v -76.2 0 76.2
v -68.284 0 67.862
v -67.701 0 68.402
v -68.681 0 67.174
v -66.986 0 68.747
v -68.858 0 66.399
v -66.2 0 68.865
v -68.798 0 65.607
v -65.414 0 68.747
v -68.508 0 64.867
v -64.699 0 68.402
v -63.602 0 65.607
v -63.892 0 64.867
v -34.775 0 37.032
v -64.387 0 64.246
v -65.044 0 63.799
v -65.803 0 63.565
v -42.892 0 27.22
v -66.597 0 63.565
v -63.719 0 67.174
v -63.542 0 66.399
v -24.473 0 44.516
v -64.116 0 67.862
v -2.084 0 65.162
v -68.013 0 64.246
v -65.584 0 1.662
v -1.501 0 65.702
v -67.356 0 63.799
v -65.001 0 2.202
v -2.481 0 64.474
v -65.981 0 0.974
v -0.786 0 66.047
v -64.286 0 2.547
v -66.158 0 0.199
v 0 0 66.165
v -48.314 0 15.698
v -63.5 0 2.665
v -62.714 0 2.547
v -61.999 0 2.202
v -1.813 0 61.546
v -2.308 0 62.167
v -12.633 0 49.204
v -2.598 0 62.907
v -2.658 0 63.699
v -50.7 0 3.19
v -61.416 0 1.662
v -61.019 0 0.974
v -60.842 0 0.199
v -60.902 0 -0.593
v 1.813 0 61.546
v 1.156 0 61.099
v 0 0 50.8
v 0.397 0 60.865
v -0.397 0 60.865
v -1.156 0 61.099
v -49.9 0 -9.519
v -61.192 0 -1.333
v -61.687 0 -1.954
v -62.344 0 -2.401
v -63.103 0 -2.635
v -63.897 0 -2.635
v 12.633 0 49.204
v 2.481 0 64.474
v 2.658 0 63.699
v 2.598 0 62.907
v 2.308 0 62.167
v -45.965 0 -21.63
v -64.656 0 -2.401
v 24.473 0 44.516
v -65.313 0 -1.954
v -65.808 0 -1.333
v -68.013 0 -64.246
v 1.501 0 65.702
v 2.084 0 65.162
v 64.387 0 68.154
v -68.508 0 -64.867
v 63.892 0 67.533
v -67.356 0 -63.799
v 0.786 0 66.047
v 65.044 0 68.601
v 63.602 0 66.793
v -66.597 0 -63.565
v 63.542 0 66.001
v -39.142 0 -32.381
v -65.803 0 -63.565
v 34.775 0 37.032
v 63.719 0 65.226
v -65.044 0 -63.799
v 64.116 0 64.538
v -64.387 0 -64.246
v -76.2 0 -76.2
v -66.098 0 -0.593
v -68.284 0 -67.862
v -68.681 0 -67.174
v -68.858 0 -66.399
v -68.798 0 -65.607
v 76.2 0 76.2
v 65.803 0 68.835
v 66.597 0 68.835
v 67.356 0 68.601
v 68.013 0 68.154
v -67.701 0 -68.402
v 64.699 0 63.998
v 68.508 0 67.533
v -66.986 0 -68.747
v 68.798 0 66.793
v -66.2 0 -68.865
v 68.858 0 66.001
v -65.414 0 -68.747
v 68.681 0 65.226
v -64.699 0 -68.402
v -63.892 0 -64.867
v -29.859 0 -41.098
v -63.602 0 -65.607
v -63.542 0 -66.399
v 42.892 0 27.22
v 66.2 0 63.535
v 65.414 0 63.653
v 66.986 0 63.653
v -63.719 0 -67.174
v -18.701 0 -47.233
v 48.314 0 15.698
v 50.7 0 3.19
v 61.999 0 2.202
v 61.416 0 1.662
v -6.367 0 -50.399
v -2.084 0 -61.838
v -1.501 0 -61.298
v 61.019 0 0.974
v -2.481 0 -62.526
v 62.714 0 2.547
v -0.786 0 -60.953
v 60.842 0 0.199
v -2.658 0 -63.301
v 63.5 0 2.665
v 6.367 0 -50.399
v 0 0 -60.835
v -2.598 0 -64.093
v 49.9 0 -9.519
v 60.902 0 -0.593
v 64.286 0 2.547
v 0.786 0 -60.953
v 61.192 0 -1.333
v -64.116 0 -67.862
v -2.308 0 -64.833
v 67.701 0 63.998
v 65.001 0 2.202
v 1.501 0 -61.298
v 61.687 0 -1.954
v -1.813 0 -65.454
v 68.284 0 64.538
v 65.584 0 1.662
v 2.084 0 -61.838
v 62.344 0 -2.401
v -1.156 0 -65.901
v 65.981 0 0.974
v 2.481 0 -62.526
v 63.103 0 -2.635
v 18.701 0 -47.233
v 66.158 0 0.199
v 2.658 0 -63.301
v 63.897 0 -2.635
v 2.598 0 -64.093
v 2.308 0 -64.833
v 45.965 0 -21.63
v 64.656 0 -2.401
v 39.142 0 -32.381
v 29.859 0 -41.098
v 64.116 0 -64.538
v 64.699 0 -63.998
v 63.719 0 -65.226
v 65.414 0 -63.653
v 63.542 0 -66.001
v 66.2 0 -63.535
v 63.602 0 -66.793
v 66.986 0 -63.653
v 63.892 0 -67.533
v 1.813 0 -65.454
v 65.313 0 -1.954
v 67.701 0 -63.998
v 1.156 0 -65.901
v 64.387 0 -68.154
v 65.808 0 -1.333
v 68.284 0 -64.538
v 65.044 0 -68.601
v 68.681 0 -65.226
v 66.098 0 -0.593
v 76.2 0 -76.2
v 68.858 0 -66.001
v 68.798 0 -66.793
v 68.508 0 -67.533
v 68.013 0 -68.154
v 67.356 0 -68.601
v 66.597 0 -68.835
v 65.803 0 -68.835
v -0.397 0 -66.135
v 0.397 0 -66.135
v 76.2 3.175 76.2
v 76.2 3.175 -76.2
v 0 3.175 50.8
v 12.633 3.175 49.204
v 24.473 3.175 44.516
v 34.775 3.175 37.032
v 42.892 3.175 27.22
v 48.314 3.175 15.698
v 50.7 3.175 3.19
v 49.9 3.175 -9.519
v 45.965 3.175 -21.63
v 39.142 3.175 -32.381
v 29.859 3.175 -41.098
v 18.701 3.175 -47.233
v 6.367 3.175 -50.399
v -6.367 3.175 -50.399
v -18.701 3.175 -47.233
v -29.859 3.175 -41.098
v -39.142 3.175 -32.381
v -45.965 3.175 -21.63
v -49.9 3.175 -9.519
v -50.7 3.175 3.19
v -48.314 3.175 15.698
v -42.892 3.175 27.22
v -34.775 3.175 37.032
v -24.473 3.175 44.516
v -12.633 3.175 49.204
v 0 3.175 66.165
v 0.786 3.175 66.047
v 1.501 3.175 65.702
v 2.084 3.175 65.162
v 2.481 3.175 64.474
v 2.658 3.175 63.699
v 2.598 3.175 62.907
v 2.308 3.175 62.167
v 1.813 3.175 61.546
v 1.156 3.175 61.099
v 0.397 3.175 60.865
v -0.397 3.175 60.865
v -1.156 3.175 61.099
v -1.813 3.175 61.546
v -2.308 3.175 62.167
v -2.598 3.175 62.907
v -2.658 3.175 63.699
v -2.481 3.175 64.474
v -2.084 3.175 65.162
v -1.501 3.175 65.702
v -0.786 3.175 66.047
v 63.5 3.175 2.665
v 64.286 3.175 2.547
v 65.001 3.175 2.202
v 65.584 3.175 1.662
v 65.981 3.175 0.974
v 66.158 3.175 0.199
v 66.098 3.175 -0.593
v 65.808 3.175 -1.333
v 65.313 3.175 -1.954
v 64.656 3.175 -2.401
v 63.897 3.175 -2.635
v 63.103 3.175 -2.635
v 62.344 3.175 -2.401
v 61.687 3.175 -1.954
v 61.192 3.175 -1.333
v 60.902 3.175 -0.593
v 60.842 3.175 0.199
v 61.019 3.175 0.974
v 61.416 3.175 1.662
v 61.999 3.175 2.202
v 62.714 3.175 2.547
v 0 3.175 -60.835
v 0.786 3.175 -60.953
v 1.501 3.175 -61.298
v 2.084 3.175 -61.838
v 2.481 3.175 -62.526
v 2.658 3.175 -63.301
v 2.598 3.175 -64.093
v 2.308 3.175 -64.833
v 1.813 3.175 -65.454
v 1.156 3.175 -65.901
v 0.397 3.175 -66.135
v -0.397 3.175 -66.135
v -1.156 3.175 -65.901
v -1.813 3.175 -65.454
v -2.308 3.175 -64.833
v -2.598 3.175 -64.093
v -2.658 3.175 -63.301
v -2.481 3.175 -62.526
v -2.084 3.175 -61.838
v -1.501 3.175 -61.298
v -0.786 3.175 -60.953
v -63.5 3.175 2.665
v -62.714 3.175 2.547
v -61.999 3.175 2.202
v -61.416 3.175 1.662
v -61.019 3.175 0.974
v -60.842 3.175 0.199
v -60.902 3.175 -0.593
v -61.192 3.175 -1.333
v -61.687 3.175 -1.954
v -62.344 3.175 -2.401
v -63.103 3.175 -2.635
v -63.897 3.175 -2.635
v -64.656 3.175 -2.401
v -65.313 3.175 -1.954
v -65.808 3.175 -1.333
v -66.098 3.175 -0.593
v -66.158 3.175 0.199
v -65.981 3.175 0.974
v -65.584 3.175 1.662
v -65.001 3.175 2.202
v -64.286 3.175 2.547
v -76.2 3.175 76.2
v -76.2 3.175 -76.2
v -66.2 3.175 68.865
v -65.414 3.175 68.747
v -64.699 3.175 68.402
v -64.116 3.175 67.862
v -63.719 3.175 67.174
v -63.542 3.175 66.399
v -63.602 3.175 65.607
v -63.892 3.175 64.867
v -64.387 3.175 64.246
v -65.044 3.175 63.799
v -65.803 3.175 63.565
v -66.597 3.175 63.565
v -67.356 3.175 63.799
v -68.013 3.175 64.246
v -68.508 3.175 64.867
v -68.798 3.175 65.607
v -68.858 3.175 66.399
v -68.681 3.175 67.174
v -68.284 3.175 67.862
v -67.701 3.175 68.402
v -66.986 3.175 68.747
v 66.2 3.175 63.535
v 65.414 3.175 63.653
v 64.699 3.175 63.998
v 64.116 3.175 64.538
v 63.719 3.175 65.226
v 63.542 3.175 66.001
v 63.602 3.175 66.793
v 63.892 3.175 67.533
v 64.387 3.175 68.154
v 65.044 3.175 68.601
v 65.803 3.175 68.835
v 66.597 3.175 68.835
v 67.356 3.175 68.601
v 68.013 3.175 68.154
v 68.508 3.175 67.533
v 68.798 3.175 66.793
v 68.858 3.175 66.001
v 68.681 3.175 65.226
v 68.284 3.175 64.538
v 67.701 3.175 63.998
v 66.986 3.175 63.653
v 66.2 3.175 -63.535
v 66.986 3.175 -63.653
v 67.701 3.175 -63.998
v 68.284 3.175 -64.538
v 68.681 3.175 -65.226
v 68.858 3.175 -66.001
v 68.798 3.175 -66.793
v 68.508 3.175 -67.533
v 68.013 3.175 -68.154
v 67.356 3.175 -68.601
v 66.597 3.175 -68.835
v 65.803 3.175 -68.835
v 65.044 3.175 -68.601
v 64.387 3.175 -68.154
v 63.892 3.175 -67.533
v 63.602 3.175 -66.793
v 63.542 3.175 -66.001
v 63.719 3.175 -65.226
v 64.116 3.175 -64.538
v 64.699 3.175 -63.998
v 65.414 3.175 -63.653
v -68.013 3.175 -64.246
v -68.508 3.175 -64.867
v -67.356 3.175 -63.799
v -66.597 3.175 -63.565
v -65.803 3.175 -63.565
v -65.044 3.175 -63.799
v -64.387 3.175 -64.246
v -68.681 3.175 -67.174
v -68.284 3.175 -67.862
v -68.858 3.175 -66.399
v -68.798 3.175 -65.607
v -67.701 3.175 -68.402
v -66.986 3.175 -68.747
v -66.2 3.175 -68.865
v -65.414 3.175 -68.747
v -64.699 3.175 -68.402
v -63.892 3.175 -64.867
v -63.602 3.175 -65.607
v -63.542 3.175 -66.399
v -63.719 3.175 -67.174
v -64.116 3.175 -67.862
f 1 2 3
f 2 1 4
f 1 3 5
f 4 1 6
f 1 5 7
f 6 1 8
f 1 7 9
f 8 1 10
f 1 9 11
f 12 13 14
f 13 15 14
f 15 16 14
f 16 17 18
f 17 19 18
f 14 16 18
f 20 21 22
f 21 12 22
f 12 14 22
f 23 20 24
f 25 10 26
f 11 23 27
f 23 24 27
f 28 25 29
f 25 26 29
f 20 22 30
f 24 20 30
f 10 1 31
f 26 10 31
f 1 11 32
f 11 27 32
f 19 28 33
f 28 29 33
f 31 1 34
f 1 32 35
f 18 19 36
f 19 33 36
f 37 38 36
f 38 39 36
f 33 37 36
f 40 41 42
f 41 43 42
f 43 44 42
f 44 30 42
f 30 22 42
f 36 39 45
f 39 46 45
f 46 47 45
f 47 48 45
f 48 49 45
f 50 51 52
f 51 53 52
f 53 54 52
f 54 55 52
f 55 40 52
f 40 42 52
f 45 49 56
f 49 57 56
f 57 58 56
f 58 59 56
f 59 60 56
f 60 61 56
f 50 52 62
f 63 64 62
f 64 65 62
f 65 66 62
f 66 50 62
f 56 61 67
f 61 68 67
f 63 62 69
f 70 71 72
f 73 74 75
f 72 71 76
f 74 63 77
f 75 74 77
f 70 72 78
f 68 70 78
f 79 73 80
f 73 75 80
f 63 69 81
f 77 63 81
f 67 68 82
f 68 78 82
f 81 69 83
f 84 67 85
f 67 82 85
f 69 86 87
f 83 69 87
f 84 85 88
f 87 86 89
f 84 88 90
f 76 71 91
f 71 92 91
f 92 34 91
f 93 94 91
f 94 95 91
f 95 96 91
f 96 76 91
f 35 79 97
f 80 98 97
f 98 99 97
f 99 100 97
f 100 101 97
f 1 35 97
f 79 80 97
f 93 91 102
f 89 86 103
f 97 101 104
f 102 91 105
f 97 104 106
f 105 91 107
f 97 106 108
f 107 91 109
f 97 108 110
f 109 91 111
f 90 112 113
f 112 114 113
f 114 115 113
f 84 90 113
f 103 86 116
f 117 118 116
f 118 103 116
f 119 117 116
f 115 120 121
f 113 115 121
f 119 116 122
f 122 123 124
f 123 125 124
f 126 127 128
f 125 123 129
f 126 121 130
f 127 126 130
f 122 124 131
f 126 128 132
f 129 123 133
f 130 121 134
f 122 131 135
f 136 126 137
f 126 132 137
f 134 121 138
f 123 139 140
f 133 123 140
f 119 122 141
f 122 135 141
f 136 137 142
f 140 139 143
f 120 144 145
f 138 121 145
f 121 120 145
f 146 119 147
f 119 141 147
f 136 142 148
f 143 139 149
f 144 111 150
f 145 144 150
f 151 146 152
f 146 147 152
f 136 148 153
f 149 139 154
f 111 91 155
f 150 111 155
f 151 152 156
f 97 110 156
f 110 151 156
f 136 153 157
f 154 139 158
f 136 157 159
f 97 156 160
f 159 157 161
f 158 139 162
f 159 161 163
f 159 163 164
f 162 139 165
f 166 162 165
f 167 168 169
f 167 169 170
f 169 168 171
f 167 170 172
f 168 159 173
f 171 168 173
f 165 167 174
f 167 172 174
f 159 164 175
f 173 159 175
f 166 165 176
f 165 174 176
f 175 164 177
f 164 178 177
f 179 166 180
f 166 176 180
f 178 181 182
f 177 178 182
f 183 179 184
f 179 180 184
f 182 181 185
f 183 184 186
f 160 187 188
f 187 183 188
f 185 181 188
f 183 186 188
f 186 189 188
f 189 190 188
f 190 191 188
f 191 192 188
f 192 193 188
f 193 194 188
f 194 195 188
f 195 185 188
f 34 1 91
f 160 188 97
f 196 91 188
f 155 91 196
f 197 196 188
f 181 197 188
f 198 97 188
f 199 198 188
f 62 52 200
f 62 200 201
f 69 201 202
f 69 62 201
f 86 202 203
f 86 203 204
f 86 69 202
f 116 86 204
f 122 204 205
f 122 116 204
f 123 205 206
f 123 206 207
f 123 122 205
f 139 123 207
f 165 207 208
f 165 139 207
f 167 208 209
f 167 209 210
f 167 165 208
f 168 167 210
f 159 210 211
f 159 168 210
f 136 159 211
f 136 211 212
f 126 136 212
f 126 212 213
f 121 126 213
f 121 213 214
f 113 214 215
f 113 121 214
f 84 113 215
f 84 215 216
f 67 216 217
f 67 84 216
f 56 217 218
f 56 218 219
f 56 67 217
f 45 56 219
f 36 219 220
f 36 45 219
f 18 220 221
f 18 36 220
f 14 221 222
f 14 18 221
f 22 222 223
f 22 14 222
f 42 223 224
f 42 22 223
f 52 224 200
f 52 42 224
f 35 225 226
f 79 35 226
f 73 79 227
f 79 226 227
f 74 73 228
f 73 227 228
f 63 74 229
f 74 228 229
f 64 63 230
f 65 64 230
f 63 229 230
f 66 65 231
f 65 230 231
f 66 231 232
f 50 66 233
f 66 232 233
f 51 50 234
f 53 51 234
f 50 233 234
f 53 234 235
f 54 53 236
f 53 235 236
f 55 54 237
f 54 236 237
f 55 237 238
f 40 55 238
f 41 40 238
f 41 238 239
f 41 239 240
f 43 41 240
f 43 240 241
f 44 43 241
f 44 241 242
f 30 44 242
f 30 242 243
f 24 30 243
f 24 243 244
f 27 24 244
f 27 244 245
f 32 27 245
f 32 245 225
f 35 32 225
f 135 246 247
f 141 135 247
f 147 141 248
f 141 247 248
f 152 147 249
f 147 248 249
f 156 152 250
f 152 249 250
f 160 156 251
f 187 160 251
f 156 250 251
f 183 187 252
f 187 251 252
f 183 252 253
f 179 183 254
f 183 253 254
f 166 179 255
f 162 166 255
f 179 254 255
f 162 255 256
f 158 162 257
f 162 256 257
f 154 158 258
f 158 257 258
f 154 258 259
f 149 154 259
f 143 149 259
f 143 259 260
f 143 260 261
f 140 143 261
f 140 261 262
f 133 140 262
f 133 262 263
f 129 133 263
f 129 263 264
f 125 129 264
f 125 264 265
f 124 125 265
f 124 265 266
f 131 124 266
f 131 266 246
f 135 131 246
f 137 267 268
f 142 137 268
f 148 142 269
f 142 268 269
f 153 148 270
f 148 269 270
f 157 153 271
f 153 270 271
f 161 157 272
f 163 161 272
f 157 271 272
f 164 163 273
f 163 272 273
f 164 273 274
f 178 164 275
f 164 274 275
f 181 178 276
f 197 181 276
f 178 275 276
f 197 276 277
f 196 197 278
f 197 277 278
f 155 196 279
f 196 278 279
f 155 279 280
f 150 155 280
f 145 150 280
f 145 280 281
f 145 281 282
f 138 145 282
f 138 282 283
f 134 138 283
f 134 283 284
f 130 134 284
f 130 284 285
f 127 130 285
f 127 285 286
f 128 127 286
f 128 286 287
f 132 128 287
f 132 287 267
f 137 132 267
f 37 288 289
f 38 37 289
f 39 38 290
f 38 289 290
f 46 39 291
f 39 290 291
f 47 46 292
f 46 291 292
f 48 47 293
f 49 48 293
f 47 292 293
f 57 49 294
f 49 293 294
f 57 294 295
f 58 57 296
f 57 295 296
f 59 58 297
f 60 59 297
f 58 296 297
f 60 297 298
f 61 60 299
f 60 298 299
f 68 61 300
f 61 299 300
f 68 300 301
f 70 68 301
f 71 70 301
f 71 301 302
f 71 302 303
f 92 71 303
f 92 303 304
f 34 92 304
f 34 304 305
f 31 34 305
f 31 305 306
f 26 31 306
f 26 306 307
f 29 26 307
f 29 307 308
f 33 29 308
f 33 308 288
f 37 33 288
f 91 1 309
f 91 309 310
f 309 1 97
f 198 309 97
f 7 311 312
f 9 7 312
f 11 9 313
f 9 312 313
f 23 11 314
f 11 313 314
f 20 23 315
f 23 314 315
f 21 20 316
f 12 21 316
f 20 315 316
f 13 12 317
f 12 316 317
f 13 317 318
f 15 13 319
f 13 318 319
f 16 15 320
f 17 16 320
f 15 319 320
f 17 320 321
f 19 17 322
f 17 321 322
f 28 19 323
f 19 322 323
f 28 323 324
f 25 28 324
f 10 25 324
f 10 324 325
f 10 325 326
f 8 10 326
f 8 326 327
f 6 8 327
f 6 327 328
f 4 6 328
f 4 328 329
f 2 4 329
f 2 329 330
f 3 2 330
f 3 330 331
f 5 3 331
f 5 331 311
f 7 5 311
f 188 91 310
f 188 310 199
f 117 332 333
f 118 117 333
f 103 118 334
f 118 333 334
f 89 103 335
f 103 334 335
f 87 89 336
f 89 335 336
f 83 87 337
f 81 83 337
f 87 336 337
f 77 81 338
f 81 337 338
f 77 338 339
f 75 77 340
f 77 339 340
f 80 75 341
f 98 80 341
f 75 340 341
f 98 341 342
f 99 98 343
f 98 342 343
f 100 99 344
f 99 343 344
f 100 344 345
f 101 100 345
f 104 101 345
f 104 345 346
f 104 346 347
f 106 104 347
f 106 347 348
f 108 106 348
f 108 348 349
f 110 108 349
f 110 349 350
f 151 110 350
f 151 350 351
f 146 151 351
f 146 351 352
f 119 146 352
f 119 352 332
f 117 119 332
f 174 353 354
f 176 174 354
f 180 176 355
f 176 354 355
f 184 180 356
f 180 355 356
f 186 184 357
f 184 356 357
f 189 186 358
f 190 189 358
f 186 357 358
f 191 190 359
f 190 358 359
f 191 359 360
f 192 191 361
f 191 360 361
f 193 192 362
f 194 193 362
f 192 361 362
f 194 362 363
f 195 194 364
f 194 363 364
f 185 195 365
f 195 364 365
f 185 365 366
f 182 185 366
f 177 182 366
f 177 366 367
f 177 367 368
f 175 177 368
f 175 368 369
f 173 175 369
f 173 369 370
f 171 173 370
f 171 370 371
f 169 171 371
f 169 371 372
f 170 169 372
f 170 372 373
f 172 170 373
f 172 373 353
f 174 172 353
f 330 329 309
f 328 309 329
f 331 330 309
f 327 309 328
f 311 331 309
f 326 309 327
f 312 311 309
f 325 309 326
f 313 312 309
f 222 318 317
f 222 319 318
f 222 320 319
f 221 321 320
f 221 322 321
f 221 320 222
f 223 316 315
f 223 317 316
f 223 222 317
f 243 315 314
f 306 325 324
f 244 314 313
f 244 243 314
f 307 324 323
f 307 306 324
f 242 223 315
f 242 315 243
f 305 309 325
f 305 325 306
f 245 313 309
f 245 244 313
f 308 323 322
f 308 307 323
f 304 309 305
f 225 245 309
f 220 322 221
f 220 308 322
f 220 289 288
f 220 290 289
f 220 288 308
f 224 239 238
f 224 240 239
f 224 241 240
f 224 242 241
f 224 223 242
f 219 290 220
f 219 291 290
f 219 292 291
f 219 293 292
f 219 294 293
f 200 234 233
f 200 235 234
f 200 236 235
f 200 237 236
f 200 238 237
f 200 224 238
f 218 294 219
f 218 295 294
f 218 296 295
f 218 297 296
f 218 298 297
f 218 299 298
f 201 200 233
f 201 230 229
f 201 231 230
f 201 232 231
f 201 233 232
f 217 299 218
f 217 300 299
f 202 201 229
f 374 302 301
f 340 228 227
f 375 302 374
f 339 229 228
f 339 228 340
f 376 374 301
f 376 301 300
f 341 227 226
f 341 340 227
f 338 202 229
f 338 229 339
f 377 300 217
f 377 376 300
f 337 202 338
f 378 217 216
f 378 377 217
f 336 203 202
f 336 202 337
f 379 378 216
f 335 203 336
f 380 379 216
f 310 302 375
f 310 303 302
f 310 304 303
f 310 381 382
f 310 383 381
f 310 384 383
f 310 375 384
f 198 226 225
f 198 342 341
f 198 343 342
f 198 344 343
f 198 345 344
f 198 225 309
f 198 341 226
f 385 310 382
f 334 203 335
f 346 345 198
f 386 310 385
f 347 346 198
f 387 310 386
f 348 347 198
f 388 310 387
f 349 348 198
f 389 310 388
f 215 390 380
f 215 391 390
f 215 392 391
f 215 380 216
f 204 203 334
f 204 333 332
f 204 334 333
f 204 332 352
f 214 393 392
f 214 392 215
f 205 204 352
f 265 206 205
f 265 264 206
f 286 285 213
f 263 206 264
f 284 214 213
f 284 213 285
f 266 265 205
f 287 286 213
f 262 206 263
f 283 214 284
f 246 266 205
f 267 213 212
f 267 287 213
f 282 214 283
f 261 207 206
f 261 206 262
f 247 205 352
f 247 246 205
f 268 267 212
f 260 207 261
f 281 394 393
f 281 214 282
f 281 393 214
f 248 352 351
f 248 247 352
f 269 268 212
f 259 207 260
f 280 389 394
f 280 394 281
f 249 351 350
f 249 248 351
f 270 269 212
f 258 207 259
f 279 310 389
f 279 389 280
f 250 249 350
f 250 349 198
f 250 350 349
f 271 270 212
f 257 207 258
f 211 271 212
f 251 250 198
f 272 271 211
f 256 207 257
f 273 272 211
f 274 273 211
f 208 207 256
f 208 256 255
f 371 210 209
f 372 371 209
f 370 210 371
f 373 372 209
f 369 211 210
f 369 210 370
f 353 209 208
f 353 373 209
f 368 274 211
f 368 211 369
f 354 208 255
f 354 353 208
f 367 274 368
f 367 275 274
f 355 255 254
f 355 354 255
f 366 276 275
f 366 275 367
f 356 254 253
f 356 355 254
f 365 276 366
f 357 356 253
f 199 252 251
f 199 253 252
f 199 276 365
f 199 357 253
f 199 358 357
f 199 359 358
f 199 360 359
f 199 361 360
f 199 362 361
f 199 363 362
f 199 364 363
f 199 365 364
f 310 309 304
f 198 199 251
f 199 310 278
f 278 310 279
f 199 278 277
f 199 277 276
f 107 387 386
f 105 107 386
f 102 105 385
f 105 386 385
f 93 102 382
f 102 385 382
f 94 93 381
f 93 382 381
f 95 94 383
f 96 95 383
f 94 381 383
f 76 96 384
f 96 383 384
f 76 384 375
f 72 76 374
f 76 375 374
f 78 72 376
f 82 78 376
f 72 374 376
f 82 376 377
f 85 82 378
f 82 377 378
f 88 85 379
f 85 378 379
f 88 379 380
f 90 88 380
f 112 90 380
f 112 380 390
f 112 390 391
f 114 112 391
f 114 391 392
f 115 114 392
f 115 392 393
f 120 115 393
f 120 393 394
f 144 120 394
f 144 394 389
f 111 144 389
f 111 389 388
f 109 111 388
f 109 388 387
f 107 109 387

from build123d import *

# Parameters (mm, degrees)
SKETCH2_W           = 152.4
SKETCH2_H           = 152.4
SKETCH2_R           = 50.8
BOSS_EXTRUDE1_DEPTH = 3.175
CUT_EXTRUDE1_REACH  = 109.81
SKETCH3_R           = 2.665000004
CUT_EXTRUDE2_REACH  = 109.81
SKETCH4_R           = 2.665000004


with BuildPart() as part:
    # Sketch2 → Boss-Extrude1 (new body)
    with BuildSketch(Plane(origin=(0, 0, 0), x_dir=(1, 0, 0), z_dir=(0, 1, 0))):
        Rectangle(SKETCH2_W, SKETCH2_H)
        with Locations(Location((0, 0, 0), (0, 0, 270))):
            Circle(SKETCH2_R, mode=Mode.SUBTRACT)
    extrude(amount=BOSS_EXTRUDE1_DEPTH)

    # Sketch3 → Cut-Extrude1 (cut, up to next)
    with BuildSketch(Plane(origin=(0, 3.175, 0), x_dir=(1, 0, 0), z_dir=(0, 1, 0)), mode=Mode.PRIVATE) as cut_extrude1_sk1:
        with Locations(Location((-66.2, -66.2, 0), (0, 0, 270))):
            Circle(SKETCH3_R)
    cut_extrude1_tool1 = extrude(cut_extrude1_sk1.sketch, amount=-CUT_EXTRUDE1_REACH, mode=Mode.PRIVATE) & part.part
    # Sketch3 → Cut-Extrude1 (cut, up to next)
    with BuildSketch(Plane(origin=(0, 3.175, 0), x_dir=(1, 0, 0), z_dir=(0, 1, 0)), mode=Mode.PRIVATE) as cut_extrude1_sk2:
        with Locations(Location((-66.2, 66.2, 0), (0, 0, 90))):
            Circle(SKETCH3_R)
    cut_extrude1_tool2 = extrude(cut_extrude1_sk2.sketch, amount=-CUT_EXTRUDE1_REACH, mode=Mode.PRIVATE) & part.part
    # Sketch3 → Cut-Extrude1 (cut, up to next)
    with BuildSketch(Plane(origin=(0, 3.175, 0), x_dir=(1, 0, 0), z_dir=(0, 1, 0)), mode=Mode.PRIVATE) as cut_extrude1_sk3:
        with Locations(Location((66.2, 66.2, 0), (0, 0, 270))):
            Circle(SKETCH3_R)
    cut_extrude1_tool3 = extrude(cut_extrude1_sk3.sketch, amount=-CUT_EXTRUDE1_REACH, mode=Mode.PRIVATE) & part.part
    # Sketch3 → Cut-Extrude1 (cut, up to next)
    with BuildSketch(Plane(origin=(0, 3.175, 0), x_dir=(1, 0, 0), z_dir=(0, 1, 0)), mode=Mode.PRIVATE) as cut_extrude1_sk4:
        with Locations(Location((66.2, -66.2, 0), (0, 0, 90))):
            Circle(SKETCH3_R)
    cut_extrude1_tool4 = extrude(cut_extrude1_sk4.sketch, amount=-CUT_EXTRUDE1_REACH, mode=Mode.PRIVATE) & part.part
    add(cut_extrude1_tool1.solids().sort_by_distance((-66.2, 3.175, 66.2))[0], mode=Mode.SUBTRACT)
    add(cut_extrude1_tool2.solids().sort_by_distance((-66.2, 3.175, -66.2))[0], mode=Mode.SUBTRACT)
    add(cut_extrude1_tool3.solids().sort_by_distance((66.2, 3.175, -66.2))[0], mode=Mode.SUBTRACT)
    add(cut_extrude1_tool4.solids().sort_by_distance((66.2, 3.175, 66.2))[0], mode=Mode.SUBTRACT)

    # Sketch4 → Cut-Extrude2 (cut, up to next)
    with BuildSketch(Plane(origin=(0, 3.175, 0), x_dir=(1, 0, 0), z_dir=(0, 1, 0)), mode=Mode.PRIVATE) as cut_extrude2_sk1:
        with Locations(Location((0, 63.5, 0), (0, 0, 270))):
            Circle(SKETCH4_R)
    cut_extrude2_tool1 = extrude(cut_extrude2_sk1.sketch, amount=-CUT_EXTRUDE2_REACH, mode=Mode.PRIVATE) & part.part
    # Sketch4 → Cut-Extrude2 (cut, up to next)
    with BuildSketch(Plane(origin=(0, 3.175, 0), x_dir=(1, 0, 0), z_dir=(0, 1, 0)), mode=Mode.PRIVATE) as cut_extrude2_sk2:
        with Locations(Location((-63.5, 0, 0), (0, 0, 270))):
            Circle(SKETCH4_R)
    cut_extrude2_tool2 = extrude(cut_extrude2_sk2.sketch, amount=-CUT_EXTRUDE2_REACH, mode=Mode.PRIVATE) & part.part
    # Sketch4 → Cut-Extrude2 (cut, up to next)
    with BuildSketch(Plane(origin=(0, 3.175, 0), x_dir=(1, 0, 0), z_dir=(0, 1, 0)), mode=Mode.PRIVATE) as cut_extrude2_sk3:
        with Locations(Location((0, -63.5, 0), (0, 0, 270))):
            Circle(SKETCH4_R)
    cut_extrude2_tool3 = extrude(cut_extrude2_sk3.sketch, amount=-CUT_EXTRUDE2_REACH, mode=Mode.PRIVATE) & part.part
    # Sketch4 → Cut-Extrude2 (cut, up to next)
    with BuildSketch(Plane(origin=(0, 3.175, 0), x_dir=(1, 0, 0), z_dir=(0, 1, 0)), mode=Mode.PRIVATE) as cut_extrude2_sk4:
        with Locations(Location((63.5, 0, 0), (0, 0, 270))):
            Circle(SKETCH4_R)
    cut_extrude2_tool4 = extrude(cut_extrude2_sk4.sketch, amount=-CUT_EXTRUDE2_REACH, mode=Mode.PRIVATE) & part.part
    add(cut_extrude2_tool1.solids().sort_by_distance((0, 3.175, -63.5))[0], mode=Mode.SUBTRACT)
    add(cut_extrude2_tool2.solids().sort_by_distance((-63.5, 3.175, 0))[0], mode=Mode.SUBTRACT)
    add(cut_extrude2_tool3.solids().sort_by_distance((0, 3.175, 63.5))[0], mode=Mode.SUBTRACT)
    add(cut_extrude2_tool4.solids().sort_by_distance((63.5, 3.175, 0))[0], mode=Mode.SUBTRACT)


solid = part.part
